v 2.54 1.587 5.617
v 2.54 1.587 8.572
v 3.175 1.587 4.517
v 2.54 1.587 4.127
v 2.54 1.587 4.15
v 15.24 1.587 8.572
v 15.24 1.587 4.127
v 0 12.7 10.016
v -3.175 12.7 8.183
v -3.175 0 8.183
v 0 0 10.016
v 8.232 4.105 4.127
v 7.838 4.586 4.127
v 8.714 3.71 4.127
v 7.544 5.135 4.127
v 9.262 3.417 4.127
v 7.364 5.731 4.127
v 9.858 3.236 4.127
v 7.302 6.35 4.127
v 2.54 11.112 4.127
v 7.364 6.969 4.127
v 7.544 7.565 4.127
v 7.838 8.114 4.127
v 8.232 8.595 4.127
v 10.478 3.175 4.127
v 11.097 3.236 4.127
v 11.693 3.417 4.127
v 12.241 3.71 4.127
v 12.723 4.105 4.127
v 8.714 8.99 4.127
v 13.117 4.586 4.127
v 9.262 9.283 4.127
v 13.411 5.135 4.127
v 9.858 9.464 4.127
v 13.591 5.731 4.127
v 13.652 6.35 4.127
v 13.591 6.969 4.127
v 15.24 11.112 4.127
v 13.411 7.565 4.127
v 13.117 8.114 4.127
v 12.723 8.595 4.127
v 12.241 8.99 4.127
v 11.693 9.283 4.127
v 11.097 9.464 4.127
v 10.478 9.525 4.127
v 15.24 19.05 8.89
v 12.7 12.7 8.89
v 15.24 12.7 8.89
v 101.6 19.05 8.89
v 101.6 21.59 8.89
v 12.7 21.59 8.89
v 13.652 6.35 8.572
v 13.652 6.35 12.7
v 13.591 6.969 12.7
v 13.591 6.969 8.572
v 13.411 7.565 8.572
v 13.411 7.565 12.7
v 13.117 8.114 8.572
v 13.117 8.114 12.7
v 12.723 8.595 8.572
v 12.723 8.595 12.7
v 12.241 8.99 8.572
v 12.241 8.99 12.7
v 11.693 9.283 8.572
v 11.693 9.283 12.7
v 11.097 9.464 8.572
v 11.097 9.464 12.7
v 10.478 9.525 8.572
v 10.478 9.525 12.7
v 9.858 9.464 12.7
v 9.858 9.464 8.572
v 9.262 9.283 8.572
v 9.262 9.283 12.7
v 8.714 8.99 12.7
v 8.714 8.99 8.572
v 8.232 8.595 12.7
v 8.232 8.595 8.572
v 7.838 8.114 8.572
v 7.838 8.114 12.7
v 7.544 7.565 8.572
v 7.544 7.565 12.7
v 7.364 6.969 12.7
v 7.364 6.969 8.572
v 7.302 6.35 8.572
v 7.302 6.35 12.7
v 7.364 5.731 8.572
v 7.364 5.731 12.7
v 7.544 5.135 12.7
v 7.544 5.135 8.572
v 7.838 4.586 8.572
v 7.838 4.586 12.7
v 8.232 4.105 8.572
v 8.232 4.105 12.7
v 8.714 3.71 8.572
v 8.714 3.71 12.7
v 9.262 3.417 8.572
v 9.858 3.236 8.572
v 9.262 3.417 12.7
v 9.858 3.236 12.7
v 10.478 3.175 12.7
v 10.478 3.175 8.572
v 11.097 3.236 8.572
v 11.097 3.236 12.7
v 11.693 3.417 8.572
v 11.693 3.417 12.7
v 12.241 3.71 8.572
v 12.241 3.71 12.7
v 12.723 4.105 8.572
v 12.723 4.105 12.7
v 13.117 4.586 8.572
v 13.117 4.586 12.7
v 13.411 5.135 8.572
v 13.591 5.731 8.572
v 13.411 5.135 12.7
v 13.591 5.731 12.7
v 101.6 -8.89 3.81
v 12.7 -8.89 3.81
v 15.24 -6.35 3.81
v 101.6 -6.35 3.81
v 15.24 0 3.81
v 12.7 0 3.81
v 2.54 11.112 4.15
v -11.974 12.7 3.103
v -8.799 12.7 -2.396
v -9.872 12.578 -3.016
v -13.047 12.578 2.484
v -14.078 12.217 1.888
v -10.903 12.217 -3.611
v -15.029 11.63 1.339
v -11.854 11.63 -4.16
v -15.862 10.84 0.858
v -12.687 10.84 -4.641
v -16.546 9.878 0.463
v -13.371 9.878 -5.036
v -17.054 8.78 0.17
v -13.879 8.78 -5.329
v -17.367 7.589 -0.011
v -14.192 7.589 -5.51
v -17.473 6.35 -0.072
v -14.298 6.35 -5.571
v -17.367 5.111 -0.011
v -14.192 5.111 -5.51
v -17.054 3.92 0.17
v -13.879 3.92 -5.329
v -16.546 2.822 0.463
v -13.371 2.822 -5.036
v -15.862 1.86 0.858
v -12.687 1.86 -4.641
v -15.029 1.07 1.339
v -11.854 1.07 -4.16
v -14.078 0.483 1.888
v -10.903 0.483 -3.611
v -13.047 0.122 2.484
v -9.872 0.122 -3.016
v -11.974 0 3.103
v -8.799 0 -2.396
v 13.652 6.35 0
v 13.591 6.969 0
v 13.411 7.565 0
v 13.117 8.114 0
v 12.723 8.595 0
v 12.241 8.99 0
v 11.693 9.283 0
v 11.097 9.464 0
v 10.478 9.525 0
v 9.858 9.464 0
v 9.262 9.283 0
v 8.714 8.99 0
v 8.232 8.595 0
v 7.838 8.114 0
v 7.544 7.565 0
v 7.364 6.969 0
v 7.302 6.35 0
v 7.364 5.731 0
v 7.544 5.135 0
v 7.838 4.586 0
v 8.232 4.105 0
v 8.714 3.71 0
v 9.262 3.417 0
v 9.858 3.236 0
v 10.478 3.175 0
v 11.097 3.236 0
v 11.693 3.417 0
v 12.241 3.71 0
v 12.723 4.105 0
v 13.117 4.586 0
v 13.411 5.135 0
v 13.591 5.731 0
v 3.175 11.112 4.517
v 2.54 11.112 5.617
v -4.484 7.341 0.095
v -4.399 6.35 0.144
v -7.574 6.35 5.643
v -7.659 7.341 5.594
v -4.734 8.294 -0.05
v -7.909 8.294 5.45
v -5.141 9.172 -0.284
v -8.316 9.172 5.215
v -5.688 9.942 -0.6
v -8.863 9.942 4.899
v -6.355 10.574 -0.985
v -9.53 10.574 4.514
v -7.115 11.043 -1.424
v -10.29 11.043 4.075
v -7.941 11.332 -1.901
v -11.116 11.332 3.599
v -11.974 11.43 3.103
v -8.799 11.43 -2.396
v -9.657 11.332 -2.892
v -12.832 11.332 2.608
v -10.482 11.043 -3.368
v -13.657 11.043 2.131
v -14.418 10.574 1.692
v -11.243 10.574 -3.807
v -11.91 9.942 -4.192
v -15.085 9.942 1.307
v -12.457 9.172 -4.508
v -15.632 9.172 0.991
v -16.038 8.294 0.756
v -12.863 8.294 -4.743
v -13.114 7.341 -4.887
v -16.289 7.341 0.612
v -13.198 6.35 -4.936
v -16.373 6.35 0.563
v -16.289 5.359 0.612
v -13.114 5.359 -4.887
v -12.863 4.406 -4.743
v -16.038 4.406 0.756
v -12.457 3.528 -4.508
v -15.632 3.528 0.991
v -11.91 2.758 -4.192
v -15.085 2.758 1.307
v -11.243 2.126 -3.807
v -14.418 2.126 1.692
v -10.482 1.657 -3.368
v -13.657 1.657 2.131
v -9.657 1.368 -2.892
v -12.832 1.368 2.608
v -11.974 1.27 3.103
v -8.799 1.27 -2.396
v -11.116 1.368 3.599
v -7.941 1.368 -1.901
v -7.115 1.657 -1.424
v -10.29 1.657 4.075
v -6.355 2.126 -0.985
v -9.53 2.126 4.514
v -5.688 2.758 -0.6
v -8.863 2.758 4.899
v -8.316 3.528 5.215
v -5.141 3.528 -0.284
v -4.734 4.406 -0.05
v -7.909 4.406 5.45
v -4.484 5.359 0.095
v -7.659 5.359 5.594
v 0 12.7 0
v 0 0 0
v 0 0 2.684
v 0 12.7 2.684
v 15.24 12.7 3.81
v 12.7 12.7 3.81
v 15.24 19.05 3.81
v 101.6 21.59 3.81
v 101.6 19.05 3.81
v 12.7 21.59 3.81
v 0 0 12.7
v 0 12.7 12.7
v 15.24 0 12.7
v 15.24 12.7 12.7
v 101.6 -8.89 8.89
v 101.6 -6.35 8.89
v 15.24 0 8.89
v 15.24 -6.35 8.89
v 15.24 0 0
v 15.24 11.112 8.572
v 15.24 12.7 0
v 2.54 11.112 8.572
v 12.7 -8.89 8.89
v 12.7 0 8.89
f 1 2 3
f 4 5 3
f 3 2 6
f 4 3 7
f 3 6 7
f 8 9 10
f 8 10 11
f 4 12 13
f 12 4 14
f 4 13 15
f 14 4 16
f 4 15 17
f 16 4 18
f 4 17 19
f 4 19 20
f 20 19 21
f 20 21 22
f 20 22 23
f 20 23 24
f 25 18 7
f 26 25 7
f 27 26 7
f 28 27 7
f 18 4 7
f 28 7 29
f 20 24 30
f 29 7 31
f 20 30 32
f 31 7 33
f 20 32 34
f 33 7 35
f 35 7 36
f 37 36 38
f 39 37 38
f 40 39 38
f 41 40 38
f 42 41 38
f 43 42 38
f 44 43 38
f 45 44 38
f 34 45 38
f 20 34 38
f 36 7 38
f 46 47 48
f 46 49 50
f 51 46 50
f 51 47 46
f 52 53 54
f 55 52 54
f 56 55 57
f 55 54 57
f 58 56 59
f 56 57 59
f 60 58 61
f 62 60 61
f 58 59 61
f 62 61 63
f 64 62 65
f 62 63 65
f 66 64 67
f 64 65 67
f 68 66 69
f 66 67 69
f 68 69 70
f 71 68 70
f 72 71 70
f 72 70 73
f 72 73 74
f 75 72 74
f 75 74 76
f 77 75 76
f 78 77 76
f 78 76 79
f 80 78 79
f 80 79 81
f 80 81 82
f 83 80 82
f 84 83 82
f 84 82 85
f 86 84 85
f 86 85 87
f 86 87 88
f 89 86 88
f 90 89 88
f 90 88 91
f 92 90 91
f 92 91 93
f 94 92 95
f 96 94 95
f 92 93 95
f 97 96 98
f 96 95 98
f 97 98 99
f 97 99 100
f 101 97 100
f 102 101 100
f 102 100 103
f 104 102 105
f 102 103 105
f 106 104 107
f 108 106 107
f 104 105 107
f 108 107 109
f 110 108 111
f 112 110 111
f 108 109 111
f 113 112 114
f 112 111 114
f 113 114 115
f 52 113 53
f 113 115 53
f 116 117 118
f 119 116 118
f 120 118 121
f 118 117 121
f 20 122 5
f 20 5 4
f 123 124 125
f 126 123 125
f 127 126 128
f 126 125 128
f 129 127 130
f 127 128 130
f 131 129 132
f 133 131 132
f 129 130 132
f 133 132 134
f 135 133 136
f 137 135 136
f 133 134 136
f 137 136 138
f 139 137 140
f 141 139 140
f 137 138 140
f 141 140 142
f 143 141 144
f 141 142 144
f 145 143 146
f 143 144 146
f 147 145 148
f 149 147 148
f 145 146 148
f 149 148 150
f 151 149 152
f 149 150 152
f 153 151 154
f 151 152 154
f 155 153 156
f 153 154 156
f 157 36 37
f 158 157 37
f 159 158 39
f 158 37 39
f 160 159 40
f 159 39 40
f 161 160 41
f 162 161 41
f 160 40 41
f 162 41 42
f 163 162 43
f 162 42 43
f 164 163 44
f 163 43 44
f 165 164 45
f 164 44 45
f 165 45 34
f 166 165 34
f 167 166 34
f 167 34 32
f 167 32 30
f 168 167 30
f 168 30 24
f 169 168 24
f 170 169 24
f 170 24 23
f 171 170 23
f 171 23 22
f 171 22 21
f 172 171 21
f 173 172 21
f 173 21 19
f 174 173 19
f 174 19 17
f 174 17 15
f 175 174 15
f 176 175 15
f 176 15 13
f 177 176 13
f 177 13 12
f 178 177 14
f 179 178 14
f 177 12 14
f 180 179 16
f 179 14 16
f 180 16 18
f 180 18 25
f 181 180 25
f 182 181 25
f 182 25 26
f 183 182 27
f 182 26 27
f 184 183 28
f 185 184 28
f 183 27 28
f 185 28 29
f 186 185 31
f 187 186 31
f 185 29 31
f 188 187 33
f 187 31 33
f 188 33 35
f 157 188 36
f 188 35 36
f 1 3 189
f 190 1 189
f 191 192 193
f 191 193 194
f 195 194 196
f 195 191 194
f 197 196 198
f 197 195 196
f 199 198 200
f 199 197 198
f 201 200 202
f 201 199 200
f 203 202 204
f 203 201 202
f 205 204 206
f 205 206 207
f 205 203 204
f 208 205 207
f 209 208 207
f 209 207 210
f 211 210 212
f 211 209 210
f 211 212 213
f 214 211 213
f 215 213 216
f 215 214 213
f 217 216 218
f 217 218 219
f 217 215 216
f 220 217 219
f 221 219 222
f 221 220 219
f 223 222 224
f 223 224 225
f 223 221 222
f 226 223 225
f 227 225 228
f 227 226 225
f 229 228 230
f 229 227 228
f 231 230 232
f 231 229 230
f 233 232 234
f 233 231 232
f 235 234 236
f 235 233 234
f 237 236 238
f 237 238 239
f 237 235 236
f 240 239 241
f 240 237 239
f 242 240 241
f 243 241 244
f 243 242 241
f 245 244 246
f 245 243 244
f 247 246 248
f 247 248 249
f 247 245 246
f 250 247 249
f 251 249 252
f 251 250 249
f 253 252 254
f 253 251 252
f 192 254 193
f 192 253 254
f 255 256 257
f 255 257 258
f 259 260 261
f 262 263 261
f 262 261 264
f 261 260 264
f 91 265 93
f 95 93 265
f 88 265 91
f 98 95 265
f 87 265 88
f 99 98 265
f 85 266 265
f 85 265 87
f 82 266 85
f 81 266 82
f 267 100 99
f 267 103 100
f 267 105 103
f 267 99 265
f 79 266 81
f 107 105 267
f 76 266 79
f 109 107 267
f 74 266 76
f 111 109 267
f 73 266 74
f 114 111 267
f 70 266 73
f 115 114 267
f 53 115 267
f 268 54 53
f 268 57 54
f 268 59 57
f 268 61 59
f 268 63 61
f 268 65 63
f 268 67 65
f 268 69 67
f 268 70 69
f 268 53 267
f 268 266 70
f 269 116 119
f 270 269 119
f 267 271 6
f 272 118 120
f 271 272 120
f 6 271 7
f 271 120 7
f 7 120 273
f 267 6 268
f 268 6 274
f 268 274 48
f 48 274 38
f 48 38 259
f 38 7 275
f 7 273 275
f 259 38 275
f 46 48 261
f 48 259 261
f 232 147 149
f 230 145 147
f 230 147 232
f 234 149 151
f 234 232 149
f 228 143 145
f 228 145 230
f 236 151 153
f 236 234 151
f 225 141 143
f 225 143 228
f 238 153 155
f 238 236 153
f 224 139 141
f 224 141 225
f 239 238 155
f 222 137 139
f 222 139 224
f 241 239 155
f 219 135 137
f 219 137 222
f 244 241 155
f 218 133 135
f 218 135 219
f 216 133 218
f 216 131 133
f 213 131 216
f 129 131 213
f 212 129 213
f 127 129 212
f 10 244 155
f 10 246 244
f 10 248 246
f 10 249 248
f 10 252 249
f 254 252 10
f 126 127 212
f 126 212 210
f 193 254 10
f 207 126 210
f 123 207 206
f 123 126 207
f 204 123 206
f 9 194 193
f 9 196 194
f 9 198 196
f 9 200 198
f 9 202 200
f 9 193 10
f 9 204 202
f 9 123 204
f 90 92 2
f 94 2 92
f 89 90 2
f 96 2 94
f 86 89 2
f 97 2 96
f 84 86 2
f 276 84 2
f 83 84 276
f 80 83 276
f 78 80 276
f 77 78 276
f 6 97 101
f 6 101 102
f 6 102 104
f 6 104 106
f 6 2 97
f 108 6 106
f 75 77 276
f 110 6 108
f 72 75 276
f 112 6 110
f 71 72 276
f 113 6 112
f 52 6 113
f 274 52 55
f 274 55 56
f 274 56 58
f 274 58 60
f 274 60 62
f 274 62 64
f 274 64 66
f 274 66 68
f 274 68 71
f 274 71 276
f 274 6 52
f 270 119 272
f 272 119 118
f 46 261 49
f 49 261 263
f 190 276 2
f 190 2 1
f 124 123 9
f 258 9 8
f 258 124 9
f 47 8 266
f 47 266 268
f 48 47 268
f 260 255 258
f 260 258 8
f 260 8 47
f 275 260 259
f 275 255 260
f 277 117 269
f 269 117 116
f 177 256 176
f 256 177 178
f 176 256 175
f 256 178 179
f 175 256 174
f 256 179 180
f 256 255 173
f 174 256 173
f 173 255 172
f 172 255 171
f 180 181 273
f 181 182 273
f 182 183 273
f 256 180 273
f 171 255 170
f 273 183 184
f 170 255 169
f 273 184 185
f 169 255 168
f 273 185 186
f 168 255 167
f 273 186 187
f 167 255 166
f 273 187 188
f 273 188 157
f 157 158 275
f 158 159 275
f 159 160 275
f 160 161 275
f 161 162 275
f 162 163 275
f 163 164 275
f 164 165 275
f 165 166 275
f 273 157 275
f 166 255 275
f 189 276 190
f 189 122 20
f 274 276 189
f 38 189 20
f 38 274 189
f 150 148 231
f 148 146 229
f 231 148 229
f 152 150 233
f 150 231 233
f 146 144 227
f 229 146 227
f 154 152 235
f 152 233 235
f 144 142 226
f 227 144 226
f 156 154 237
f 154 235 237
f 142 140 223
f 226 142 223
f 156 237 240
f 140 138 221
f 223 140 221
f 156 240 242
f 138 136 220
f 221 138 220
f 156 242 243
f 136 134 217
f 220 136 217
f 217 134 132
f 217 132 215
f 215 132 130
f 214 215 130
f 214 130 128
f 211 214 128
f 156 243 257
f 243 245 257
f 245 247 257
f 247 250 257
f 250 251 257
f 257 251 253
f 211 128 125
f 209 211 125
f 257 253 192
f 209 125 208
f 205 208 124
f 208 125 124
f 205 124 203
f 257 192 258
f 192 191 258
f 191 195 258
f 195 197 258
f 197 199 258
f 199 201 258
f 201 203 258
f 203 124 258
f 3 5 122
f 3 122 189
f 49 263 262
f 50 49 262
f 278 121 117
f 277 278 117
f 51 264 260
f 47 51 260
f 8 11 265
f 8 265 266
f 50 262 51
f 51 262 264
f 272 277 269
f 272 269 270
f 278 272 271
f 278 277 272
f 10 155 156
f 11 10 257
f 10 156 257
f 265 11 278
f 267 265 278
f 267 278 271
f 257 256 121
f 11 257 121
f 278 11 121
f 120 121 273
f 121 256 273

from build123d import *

# Parameters (mm, degrees)
SKETCH1_W               = 12.7
SKETCH1_H               = 12.7
BOSS_EXTRUDE1_DEPTH     = 12.7
SKETCH3_W               = 3.81
SKETCH3_H               = 8.89
CUT_EXTRUDE1_DEPTH      = 93.361399405
SKETCH4_W               = 4.445
SKETCH4_H               = 9.525
CUT_EXTRUDE2_DEPTH      = 12.7
SKETCH5_R               = 3.175
CUT_EXTRUDE3_DEPTH      = 12.7
BOSS_EXTRUDE3_DEPTH     = 12.7
BOSS_EXTRUDE2_START     = -6.35
BOSS_EXTRUDE2_OUTLINE_R = 5.08
BOSS_EXTRUDE2_DEPTH     = 6.35


# Read off the part's stored shape, not the designer's step: Boss-Extrude2
with BuildPart() as part:
    # Sketch1 → Boss-Extrude1 (new body)
    with BuildSketch(Plane.XY):
        with Locations((6.35, 6.35)):
            Rectangle(SKETCH1_W, SKETCH1_H)
        Polygon((12.7, 12.7), (12.7, 0), (12.7, -8.89), (101.6, -8.89), (101.6, -6.35), (15.24, -6.35), (15.24, 19.05), (101.6, 19.05), (101.6, 21.59), (12.7, 21.59), align=None)
    extrude(amount=BOSS_EXTRUDE1_DEPTH)

    # Sketch3 → Cut-Extrude1 (cut, through all)
    with BuildSketch(Plane.ZY.offset(-12.7)):
        with Locations((1.905, 17.145)):
            Rectangle(SKETCH3_W, SKETCH3_H)
        with Locations((10.795, 17.145)):
            Rectangle(SKETCH3_W, SKETCH3_H)
        with Locations((10.795, -4.445)):
            Rectangle(SKETCH3_W, SKETCH3_H)
        with Locations((1.905, -4.445)):
            Rectangle(SKETCH3_W, SKETCH3_H)
    extrude(amount=-CUT_EXTRUDE1_DEPTH, mode=Mode.SUBTRACT)

    # Sketch4 → Cut-Extrude2 (cut)
    with BuildSketch(Plane(origin=(15.24, 0, 0), x_dir=(0, 0, -1), z_dir=(1, 0, 0))):
        with Locations((-6.35, 6.35)):
            Rectangle(SKETCH4_W, SKETCH4_H)
    extrude(amount=-CUT_EXTRUDE2_DEPTH, mode=Mode.SUBTRACT)

    # Sketch5 → Cut-Extrude3 (cut)
    with BuildSketch(Plane.XY.offset(12.7)):
        with Locations((10.4775, 6.35)):
            Circle(SKETCH5_R)
    extrude(amount=-CUT_EXTRUDE3_DEPTH, mode=Mode.SUBTRACT)

    # Sketch7 → Boss-Extrude3 (add)
    with BuildSketch(Plane(origin=(0, 12.7, 0), x_dir=(1, 0, 0), z_dir=(0, 1, 0))):
        Polygon((0, -2.683825791), (-3.175, -8.183087105), (0, -10.016174209), align=None)
    extrude(amount=-BOSS_EXTRUDE3_DEPTH)

    # Boss-Extrude2 outline → Boss-Extrude2 (add)
    with BuildSketch(Plane(origin=(0.622783942, 0, 10.375738686), x_dir=(0.8660254037844416, 0, 0.499999999999995), z_dir=(-0.49999999999999495, 0, 0.8660254037844415)).offset(BOSS_EXTRUDE2_START)):
        with BuildLine():
            Line((-0.719128953, 12.7), (-14.545303163, 12.7))
            ThreePointArc((-14.545303163, 12.7), (-20.895303163, 6.35), (-14.545303163, 0))
            Line((-14.545303163, 0), (-0.719128953, 0))
            Line((-0.719128953, 0), (-0.719128953, 12.7))
        make_face()
        with Locations((-14.545303163, 6.35)):
            Circle(BOSS_EXTRUDE2_OUTLINE_R, mode=Mode.SUBTRACT)
    extrude(amount=BOSS_EXTRUDE2_DEPTH)


solid = part.part
